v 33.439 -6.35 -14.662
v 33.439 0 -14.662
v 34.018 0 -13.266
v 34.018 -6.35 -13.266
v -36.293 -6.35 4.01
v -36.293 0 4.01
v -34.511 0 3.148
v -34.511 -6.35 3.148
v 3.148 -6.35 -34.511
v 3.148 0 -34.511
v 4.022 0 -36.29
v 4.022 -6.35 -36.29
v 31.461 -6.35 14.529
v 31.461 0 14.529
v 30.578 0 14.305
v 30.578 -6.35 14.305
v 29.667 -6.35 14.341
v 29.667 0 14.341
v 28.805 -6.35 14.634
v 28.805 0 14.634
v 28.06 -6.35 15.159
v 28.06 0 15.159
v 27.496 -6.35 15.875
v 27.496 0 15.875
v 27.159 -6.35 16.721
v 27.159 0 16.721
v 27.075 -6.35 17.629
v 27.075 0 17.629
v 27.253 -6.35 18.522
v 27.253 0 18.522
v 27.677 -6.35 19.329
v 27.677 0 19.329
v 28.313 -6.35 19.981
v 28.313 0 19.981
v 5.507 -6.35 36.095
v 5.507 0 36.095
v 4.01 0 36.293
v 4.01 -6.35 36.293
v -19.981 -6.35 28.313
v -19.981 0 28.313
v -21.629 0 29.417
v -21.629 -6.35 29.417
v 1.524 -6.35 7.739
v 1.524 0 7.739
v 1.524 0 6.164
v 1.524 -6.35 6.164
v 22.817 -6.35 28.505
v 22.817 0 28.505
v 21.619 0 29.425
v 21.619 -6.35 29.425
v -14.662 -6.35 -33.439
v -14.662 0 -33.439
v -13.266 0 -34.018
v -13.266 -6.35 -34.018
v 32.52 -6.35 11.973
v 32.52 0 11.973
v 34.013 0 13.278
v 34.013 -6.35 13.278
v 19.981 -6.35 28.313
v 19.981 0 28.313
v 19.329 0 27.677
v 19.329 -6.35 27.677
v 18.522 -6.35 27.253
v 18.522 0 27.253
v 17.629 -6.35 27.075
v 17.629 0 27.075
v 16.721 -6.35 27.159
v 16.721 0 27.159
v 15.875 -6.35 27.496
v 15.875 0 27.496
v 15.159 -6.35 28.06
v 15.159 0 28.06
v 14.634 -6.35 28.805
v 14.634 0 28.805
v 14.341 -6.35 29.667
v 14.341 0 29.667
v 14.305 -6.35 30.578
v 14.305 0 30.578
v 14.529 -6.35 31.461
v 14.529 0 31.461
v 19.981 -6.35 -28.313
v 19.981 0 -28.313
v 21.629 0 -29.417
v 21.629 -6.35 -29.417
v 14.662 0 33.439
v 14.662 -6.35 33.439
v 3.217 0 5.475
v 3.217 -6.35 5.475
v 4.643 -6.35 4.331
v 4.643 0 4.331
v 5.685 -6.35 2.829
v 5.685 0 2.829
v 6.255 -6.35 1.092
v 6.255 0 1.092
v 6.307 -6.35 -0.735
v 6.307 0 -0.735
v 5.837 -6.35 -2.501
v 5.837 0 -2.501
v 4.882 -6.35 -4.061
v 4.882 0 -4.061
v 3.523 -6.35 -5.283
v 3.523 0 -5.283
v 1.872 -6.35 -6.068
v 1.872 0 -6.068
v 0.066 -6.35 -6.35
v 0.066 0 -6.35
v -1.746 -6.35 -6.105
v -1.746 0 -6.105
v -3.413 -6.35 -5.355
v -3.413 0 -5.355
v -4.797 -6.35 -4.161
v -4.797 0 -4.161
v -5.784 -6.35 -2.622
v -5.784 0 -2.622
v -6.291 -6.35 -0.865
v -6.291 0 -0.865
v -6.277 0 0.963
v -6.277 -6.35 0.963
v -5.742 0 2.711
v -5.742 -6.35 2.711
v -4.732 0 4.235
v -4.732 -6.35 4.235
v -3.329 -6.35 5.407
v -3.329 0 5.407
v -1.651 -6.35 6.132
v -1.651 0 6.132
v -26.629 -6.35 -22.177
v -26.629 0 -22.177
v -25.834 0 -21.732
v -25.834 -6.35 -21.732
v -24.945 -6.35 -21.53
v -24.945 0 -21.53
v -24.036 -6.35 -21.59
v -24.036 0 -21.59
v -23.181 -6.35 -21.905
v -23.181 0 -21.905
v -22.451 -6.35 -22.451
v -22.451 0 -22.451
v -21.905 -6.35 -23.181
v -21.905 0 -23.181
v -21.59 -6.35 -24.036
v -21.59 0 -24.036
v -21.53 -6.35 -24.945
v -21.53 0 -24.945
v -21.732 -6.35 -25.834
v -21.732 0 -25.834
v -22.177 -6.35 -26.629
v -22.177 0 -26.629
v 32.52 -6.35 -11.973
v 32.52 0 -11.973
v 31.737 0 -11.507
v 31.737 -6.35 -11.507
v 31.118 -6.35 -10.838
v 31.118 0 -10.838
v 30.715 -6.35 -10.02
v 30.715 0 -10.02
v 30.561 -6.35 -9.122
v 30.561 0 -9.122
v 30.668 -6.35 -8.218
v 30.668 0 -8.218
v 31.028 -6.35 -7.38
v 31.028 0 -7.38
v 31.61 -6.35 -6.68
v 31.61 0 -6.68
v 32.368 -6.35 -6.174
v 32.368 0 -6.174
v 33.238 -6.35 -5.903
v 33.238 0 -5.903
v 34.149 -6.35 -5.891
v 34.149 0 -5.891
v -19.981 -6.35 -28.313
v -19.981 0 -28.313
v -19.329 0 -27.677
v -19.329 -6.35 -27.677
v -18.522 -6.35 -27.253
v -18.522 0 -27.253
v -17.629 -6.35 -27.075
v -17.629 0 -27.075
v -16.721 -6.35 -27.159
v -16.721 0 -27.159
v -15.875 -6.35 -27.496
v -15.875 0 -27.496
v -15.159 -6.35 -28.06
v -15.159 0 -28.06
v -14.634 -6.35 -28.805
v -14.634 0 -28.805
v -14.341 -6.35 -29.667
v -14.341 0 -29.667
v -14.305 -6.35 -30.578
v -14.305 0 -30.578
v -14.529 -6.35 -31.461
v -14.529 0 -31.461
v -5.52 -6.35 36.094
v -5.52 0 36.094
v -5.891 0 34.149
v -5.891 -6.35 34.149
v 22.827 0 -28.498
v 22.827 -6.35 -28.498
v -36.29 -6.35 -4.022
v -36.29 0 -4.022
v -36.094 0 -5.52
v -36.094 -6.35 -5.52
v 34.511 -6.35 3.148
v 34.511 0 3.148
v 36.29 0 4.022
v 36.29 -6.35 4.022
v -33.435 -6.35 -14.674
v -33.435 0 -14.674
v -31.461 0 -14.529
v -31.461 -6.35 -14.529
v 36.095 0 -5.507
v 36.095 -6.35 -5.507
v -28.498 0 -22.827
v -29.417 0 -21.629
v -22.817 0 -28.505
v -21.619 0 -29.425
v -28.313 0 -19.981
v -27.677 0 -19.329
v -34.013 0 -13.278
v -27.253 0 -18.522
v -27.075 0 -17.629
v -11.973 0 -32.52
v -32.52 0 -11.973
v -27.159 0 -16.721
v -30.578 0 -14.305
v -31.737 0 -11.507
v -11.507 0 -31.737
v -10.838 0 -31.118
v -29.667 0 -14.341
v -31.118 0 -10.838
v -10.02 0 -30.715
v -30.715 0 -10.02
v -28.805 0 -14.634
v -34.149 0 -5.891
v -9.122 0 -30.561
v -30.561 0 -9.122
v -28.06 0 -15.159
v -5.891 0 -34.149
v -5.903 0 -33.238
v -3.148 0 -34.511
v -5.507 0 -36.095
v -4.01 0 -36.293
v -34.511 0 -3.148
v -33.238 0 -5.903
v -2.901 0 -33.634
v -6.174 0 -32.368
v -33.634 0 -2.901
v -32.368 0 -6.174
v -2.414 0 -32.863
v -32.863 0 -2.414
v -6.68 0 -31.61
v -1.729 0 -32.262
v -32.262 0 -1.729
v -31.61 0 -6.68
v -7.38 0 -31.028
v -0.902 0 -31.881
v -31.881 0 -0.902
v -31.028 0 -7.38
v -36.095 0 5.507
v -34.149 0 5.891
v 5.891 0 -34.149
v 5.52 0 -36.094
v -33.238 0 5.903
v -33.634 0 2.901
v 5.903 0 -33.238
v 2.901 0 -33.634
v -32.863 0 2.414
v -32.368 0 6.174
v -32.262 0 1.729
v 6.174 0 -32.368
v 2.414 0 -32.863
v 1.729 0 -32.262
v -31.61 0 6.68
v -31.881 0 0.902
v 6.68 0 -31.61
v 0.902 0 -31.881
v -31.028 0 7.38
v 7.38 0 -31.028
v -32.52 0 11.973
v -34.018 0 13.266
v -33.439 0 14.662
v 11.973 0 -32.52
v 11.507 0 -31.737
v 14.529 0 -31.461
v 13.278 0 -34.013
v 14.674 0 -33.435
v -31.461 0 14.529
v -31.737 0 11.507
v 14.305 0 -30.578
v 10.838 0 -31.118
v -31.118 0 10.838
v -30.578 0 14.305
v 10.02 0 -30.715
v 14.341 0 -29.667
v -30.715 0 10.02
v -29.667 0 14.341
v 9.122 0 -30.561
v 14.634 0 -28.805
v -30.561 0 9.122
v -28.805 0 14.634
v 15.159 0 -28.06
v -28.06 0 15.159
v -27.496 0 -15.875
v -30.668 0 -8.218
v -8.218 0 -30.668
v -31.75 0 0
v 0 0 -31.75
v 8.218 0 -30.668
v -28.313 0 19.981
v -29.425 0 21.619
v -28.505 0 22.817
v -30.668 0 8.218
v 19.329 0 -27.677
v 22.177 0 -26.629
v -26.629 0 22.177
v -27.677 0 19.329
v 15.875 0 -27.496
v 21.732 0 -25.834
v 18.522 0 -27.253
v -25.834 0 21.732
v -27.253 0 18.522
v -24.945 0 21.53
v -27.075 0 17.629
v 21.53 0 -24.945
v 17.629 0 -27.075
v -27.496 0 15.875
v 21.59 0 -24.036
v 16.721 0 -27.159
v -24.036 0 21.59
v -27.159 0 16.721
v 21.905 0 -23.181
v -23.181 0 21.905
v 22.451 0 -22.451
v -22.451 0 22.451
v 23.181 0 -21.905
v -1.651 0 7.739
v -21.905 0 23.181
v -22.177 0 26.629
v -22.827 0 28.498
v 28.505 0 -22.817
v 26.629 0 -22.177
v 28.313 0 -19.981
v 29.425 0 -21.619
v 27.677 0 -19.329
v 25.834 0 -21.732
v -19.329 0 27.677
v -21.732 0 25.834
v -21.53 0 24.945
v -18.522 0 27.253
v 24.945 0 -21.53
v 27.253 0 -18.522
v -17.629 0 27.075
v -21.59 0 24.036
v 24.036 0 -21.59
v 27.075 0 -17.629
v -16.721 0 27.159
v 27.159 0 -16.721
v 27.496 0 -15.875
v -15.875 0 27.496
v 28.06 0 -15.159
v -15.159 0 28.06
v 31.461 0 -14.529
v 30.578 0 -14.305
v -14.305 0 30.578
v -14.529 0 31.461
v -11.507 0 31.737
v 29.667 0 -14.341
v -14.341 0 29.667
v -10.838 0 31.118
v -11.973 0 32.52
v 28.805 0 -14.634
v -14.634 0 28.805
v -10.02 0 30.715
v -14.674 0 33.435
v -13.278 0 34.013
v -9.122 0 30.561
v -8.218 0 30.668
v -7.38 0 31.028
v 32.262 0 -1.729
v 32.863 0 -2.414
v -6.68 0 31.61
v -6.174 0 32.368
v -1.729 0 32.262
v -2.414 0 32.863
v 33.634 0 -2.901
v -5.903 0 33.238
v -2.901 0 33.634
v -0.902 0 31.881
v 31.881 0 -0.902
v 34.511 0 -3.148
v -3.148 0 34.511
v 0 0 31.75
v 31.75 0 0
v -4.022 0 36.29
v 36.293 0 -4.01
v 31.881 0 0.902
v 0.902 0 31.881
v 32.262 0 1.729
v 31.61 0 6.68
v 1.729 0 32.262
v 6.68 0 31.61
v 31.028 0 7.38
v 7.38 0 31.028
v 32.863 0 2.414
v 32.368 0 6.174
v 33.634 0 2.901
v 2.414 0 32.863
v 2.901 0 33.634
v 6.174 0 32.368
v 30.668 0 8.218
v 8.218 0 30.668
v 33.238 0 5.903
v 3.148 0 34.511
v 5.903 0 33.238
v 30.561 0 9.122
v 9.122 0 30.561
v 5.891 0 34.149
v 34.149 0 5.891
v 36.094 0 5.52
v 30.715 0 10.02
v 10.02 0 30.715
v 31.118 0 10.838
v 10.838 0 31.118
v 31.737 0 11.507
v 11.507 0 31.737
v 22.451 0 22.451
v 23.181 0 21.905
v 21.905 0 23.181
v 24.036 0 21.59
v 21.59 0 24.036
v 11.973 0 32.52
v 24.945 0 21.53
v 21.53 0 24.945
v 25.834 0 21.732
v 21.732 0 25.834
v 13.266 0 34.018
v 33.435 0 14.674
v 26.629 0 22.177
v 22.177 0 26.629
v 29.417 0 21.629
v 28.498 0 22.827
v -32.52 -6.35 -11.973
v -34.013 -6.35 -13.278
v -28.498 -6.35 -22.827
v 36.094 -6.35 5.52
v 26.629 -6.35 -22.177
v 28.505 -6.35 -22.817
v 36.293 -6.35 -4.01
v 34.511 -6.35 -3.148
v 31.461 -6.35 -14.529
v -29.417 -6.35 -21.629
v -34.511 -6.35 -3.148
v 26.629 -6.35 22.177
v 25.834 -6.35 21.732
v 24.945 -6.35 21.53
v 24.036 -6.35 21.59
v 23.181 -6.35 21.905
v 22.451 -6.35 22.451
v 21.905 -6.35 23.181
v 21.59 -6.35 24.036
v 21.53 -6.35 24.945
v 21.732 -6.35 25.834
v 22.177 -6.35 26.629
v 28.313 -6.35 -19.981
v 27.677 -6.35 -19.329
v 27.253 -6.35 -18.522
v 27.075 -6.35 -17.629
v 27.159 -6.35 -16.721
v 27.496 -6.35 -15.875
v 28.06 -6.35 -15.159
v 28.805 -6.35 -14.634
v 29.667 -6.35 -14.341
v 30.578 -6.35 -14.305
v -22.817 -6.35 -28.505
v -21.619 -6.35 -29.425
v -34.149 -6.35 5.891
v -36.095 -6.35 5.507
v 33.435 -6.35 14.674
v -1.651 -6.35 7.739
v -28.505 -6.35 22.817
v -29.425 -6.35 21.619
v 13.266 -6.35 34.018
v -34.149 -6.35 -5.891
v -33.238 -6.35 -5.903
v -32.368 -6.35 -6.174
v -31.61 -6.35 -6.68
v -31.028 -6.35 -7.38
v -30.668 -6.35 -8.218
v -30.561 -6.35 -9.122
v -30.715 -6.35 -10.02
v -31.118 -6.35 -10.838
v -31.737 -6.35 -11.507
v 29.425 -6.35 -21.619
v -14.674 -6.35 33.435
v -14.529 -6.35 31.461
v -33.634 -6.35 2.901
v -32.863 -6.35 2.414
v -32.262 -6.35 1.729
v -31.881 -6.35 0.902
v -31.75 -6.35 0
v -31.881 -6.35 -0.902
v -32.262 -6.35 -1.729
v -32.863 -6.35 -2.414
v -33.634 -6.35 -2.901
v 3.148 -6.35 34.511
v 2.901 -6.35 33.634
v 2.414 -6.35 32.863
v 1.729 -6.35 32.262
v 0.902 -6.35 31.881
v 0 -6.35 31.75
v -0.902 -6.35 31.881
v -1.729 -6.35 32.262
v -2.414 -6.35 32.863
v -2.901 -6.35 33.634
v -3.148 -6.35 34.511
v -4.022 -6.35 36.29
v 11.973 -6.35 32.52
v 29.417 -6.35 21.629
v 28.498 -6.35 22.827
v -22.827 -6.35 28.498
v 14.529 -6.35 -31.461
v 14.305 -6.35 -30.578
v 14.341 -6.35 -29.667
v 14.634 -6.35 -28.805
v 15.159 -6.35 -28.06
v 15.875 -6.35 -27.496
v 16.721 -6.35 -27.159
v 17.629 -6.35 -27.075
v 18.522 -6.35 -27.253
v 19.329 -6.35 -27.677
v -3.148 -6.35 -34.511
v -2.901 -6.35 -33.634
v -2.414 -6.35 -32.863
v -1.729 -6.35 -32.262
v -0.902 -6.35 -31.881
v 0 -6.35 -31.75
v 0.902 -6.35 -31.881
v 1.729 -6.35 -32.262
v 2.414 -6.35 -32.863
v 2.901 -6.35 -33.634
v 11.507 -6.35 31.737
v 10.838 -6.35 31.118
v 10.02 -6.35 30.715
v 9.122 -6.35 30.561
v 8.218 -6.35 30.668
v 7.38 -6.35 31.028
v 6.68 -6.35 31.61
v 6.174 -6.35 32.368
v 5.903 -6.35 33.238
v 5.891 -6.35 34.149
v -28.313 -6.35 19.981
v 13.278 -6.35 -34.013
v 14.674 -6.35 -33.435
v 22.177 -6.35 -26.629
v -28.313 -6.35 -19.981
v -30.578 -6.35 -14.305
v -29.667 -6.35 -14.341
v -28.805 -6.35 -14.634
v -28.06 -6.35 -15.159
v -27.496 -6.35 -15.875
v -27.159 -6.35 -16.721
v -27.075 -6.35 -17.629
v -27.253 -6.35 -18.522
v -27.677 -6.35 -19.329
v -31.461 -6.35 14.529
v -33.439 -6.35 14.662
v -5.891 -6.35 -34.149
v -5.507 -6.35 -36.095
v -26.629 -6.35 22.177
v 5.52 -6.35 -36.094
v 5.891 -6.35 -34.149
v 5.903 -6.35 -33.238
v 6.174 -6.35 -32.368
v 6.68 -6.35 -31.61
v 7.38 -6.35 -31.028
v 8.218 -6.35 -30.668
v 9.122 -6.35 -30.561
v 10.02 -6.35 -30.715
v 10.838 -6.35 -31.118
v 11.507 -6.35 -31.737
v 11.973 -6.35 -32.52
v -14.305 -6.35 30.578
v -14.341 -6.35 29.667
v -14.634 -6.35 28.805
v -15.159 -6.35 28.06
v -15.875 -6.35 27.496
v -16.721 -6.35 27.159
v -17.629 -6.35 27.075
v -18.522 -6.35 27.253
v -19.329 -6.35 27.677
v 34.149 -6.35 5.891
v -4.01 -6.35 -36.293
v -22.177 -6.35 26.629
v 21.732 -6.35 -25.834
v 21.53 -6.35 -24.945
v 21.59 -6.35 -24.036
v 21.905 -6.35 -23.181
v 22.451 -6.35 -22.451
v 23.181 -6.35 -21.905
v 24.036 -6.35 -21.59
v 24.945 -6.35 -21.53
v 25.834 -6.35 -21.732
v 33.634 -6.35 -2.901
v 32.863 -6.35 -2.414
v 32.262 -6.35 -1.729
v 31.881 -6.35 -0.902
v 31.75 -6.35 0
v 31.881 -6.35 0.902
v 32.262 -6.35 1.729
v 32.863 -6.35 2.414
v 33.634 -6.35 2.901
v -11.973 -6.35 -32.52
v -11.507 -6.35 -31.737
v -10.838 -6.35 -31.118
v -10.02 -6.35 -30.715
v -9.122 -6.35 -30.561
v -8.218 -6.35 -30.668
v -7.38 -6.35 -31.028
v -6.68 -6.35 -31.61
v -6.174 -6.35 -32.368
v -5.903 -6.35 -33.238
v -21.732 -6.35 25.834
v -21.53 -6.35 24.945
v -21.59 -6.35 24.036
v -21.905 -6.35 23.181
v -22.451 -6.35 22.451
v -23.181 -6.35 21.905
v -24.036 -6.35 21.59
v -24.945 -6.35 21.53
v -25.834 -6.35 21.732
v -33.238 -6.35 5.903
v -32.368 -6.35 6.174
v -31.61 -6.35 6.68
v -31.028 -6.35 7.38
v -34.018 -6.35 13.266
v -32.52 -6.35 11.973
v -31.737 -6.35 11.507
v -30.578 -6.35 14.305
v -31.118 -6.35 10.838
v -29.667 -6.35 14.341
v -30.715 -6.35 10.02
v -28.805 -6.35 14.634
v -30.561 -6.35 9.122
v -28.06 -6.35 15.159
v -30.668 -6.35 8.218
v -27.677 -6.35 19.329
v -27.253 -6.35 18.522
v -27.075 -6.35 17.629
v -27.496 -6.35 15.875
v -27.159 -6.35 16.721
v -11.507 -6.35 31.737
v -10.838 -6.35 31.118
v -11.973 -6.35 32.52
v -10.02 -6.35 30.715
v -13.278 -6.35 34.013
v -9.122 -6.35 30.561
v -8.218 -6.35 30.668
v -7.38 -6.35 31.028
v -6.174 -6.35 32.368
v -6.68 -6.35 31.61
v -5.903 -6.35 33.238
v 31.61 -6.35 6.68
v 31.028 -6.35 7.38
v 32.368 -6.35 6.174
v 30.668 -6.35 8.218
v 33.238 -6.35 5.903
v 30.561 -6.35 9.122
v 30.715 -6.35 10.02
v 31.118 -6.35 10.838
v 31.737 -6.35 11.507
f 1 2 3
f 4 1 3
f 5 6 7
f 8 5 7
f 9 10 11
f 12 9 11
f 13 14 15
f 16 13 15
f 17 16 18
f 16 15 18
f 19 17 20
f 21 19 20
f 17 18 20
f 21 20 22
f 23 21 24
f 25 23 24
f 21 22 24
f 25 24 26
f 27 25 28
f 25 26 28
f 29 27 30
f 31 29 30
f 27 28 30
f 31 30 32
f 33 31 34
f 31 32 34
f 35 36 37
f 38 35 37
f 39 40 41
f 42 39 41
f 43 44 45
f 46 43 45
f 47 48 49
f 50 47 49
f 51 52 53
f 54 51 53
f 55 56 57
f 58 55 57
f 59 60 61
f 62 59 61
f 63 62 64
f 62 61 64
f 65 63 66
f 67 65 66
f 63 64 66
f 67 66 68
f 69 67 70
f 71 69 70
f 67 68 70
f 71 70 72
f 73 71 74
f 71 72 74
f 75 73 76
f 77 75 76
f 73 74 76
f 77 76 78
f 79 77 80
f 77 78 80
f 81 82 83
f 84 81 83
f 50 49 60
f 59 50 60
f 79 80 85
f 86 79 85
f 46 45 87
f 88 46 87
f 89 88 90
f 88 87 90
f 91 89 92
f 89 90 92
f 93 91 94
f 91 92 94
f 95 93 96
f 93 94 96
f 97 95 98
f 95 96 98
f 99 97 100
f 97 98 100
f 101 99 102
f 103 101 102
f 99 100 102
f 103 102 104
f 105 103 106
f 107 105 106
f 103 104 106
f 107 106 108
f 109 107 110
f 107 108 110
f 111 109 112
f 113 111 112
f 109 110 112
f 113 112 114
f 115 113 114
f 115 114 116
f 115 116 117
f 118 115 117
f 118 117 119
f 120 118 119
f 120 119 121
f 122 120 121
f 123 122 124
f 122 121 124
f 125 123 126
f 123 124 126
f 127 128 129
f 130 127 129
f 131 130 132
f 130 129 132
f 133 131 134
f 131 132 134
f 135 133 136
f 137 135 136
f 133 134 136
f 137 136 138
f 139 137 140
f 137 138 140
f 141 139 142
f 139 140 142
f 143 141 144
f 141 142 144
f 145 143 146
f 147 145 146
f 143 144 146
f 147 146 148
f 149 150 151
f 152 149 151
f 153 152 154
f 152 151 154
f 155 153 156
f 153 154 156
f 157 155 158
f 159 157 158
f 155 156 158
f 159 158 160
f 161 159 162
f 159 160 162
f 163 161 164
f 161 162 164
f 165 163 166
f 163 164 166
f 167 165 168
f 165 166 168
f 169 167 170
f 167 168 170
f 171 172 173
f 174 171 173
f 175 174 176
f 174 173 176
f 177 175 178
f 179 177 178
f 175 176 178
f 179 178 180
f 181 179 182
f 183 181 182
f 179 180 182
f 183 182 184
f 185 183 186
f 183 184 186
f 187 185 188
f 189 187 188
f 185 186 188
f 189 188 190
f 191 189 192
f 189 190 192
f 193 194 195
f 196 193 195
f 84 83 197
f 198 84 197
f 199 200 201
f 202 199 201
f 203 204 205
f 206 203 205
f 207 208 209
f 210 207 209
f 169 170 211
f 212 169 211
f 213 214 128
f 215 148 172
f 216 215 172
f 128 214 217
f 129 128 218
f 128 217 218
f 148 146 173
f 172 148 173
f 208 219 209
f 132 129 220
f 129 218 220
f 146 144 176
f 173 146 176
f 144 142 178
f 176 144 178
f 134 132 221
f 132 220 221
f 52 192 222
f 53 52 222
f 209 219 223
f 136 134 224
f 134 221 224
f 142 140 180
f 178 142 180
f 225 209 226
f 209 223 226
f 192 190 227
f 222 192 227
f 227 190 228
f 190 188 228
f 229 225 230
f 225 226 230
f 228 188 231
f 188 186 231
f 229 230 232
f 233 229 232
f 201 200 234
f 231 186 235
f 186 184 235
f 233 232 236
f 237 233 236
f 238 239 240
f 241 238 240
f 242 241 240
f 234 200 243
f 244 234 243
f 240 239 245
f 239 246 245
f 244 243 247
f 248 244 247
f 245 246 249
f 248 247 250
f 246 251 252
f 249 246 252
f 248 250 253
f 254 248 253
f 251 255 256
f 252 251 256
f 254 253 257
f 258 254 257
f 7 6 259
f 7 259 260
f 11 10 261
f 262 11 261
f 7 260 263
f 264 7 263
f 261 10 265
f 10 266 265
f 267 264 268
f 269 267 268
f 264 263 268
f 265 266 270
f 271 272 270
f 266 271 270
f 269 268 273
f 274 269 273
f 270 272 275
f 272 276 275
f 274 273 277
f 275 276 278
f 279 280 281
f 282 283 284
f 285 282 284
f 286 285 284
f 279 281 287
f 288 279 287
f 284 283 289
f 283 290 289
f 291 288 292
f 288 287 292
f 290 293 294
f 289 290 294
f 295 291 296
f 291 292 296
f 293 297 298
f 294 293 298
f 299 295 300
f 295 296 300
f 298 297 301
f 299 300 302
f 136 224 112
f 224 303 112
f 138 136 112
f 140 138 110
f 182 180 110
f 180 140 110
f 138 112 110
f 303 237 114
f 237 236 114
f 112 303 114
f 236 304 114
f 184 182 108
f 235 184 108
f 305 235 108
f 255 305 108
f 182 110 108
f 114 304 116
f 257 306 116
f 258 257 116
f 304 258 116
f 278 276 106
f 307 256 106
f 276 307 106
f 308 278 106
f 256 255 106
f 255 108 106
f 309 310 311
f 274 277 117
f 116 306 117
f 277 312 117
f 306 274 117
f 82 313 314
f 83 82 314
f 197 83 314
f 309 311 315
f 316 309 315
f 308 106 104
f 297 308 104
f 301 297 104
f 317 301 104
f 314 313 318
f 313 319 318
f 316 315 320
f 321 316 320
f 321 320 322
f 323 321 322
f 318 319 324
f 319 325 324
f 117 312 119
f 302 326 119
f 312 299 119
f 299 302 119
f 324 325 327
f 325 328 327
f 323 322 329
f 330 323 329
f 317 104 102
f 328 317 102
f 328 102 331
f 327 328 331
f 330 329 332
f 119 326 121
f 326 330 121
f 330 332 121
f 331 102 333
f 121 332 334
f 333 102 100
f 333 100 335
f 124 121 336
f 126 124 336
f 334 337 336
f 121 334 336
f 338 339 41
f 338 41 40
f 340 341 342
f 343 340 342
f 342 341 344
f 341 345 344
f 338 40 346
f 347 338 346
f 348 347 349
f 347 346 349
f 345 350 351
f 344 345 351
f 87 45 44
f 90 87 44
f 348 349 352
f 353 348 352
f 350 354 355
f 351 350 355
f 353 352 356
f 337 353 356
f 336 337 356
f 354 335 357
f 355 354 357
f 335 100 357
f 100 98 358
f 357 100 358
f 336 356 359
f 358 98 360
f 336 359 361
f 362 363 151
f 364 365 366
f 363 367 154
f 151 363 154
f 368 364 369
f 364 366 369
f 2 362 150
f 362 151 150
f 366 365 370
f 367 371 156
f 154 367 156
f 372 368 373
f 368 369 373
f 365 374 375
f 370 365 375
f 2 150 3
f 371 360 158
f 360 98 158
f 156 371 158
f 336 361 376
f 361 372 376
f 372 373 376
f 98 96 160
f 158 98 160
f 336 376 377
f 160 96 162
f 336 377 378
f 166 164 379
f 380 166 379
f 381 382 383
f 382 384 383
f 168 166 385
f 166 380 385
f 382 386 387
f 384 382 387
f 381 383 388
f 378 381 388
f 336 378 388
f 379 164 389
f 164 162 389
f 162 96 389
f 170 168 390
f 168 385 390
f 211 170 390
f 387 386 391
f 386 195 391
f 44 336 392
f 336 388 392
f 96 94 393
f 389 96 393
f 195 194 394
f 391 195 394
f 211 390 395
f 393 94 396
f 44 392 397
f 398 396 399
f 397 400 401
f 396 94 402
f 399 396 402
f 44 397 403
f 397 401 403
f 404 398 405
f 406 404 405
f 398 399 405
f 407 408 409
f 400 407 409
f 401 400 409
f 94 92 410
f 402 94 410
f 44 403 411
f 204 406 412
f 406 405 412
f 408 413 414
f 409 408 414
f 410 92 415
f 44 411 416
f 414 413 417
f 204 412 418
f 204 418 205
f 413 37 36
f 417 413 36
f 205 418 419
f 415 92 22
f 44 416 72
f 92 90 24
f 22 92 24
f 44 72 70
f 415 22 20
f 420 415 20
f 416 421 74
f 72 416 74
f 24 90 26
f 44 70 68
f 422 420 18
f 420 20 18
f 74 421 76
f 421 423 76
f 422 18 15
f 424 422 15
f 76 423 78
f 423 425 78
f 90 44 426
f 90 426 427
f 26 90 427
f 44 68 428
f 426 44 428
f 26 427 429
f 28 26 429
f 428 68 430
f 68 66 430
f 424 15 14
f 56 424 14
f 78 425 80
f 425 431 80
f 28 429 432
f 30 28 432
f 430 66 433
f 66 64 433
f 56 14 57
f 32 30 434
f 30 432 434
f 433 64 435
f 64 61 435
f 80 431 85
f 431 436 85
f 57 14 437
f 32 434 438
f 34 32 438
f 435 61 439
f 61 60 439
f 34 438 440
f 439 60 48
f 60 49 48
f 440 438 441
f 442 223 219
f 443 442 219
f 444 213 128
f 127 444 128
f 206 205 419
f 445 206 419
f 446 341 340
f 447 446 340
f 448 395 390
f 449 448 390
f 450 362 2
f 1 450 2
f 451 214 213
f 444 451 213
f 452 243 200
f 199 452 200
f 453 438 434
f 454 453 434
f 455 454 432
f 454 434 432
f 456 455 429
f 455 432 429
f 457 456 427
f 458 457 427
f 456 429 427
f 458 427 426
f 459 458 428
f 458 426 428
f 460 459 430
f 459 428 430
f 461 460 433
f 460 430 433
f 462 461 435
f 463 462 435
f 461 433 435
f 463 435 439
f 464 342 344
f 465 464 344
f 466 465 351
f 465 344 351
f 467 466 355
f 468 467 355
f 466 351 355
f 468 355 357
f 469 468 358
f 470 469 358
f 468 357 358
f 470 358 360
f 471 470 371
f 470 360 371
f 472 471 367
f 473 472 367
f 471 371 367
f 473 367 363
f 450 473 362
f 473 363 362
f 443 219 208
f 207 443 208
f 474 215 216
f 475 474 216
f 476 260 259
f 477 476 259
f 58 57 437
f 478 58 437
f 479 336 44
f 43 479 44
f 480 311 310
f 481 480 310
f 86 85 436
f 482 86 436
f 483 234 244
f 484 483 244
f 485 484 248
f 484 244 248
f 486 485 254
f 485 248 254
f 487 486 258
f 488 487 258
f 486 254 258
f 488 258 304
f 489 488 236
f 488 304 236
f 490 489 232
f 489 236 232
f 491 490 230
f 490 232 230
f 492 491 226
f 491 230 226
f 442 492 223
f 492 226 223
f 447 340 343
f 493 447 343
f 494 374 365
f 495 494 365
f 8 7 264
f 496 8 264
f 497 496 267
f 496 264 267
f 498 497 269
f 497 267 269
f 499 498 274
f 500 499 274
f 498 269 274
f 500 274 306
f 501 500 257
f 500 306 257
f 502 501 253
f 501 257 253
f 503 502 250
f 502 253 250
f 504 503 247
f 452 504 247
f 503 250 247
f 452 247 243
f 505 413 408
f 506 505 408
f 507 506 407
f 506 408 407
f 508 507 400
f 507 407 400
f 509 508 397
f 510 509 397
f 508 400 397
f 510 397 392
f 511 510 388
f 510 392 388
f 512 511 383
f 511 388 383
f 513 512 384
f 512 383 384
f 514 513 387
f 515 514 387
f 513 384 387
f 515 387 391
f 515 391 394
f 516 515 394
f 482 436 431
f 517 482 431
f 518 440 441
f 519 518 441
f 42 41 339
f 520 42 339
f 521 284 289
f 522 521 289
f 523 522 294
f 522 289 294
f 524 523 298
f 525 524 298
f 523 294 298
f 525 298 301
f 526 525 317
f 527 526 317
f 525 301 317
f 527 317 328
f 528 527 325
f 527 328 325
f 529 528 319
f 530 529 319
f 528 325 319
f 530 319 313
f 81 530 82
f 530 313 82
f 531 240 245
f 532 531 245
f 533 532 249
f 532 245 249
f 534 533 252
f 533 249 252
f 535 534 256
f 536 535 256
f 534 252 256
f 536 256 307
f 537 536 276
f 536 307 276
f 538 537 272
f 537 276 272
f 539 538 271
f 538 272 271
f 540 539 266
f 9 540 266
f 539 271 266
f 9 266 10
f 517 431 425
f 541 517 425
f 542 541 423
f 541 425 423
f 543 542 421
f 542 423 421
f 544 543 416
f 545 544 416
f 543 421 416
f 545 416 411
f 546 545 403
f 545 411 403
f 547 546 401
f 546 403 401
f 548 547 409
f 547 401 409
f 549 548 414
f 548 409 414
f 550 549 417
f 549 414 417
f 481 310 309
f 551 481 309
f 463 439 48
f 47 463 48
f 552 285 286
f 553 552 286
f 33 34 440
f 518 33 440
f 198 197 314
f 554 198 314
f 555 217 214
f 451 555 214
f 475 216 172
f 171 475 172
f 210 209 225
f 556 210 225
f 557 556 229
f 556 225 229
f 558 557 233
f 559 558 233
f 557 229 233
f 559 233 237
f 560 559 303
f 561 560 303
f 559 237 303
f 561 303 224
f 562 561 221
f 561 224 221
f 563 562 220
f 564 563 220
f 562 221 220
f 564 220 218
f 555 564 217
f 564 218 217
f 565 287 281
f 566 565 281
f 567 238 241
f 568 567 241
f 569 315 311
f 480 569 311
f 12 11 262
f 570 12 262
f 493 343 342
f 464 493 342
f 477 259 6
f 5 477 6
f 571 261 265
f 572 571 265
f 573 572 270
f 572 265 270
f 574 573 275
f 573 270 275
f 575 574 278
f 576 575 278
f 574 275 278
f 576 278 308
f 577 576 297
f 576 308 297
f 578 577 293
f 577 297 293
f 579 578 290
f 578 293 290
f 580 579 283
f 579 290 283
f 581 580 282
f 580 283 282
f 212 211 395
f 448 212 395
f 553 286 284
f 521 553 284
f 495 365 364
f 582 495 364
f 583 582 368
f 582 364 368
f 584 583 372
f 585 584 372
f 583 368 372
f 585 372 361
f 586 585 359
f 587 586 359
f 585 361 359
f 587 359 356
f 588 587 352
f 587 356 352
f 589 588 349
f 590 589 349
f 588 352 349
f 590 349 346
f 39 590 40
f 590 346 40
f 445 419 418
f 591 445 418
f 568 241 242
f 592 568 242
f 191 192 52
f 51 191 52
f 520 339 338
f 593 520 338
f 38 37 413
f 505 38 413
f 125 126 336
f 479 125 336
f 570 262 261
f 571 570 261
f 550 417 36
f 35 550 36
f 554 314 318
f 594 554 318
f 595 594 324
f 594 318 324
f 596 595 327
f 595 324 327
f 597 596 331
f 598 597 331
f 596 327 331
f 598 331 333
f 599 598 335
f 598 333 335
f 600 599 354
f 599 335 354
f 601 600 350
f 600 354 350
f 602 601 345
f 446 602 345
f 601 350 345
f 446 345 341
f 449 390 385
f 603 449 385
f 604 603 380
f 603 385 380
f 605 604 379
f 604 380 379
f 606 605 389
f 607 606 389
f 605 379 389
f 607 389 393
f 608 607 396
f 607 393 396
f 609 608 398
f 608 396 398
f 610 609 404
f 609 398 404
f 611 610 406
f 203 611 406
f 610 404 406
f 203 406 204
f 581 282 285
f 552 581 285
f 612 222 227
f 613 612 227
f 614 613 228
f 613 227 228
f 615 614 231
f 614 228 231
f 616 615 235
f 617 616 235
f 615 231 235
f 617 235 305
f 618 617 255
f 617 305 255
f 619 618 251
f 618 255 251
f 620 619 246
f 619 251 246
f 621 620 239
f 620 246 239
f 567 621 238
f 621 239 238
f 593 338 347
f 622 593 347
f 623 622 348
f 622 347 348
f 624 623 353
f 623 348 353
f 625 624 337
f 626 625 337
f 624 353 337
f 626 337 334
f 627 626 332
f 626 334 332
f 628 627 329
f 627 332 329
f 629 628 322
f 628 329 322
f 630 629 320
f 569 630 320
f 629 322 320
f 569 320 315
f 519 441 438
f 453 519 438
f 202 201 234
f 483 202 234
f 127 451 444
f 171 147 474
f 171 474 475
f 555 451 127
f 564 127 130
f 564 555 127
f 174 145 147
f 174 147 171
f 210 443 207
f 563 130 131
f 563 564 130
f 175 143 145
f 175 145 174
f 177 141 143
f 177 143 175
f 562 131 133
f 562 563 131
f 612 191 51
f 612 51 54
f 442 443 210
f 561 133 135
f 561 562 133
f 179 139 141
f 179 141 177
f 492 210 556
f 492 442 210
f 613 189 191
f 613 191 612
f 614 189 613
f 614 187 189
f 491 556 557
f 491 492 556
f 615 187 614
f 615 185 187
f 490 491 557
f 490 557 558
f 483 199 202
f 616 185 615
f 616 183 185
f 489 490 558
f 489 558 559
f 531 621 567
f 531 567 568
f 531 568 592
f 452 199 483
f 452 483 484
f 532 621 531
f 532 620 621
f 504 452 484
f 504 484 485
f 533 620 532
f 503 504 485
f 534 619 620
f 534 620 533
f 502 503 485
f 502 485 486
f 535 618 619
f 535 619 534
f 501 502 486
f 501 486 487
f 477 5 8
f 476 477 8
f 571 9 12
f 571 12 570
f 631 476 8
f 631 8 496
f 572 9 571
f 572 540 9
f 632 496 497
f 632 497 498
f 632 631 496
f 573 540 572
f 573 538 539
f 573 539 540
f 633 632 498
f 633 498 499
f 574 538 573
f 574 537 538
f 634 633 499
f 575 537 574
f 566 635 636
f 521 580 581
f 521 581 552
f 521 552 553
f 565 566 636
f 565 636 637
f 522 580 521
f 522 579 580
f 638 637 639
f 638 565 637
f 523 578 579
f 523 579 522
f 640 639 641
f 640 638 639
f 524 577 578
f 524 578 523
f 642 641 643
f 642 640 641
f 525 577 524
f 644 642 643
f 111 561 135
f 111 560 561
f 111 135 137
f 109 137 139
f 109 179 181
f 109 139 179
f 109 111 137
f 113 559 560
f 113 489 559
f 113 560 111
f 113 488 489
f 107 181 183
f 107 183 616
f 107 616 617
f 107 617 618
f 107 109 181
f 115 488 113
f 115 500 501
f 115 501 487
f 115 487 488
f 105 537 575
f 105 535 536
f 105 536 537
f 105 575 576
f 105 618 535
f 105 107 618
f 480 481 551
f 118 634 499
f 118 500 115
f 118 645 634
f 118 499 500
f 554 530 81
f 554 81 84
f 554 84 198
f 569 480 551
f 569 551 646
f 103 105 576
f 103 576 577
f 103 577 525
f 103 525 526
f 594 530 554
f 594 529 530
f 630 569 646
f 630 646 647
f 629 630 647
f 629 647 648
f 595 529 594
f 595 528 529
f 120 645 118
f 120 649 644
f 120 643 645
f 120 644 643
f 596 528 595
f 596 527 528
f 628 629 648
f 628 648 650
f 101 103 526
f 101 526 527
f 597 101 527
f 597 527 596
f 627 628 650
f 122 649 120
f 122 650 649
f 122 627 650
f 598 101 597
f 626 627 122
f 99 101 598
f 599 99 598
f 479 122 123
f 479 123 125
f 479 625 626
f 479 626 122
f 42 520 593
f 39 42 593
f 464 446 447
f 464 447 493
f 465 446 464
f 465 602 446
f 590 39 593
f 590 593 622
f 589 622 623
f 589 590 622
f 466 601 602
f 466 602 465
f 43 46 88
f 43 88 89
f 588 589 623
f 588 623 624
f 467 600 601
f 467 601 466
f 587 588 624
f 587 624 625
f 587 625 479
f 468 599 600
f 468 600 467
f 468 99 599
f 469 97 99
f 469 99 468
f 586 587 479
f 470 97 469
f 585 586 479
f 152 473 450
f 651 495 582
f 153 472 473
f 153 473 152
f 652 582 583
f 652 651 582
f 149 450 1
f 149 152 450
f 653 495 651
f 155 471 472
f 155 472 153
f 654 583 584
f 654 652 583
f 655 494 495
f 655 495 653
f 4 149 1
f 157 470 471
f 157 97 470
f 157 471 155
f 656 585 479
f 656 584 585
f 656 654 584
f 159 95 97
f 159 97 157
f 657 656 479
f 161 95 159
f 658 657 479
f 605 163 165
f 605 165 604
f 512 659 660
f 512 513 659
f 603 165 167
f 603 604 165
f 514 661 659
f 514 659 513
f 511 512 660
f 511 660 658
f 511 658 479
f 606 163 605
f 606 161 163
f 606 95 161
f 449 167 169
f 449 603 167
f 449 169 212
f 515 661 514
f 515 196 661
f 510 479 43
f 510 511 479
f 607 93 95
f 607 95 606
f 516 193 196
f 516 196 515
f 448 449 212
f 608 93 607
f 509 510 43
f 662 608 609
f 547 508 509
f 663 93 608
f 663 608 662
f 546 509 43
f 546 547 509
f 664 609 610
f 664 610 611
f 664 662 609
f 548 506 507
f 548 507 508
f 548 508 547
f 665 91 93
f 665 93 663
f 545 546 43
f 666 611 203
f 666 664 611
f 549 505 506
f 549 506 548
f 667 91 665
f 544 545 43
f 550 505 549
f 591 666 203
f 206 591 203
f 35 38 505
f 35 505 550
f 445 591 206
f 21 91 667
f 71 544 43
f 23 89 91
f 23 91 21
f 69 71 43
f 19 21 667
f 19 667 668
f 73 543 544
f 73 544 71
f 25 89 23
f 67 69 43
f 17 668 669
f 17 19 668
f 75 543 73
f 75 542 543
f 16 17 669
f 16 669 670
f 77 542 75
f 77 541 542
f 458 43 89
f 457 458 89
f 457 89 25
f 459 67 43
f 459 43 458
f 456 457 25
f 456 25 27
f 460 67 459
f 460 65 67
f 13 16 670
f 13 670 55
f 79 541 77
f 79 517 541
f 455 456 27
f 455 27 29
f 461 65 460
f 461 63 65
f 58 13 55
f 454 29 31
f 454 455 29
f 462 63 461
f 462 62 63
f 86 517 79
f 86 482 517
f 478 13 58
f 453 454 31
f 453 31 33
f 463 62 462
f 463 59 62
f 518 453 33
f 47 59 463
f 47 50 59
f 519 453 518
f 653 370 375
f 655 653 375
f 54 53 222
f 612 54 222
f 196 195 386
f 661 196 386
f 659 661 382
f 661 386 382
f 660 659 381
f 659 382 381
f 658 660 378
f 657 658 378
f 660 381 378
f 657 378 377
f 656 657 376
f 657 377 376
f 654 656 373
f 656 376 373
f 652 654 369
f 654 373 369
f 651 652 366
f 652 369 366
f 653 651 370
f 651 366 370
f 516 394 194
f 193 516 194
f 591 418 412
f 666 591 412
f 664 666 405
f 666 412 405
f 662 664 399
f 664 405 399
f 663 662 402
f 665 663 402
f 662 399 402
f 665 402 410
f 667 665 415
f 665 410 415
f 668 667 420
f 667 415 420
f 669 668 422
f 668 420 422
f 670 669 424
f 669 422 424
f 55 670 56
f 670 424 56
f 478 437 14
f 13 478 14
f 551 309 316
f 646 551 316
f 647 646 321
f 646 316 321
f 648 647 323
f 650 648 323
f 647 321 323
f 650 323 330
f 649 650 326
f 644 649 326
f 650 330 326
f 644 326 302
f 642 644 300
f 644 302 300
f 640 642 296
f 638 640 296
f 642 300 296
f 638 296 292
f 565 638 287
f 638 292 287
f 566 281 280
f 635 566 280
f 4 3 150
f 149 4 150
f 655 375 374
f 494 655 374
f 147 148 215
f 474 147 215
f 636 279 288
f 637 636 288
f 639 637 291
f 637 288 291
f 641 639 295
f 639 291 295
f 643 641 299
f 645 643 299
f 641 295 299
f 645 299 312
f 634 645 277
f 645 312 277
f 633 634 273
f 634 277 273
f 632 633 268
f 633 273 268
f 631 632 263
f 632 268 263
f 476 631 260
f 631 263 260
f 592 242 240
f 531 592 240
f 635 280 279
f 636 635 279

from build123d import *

# Parameters (mm, degrees)
F1_DEPTH = 6.35


with BuildPart() as f1:
    # F0 (on Front) → F1 (new body)
    with BuildSketch(Plane.XZ):
        with BuildLine():
            ThreePointArc((3.147837, 34.510579), (0, 31.75), (-3.147837, 34.510579))
            Line((-3.147837, 34.510579), (-4.022344, 36.290266))
            Line((-4.022344, 36.290266), (-5.520025, 36.093734))
            Line((-5.520025, 36.093734), (-5.891418, 34.14938))
            ThreePointArc((-5.891418, 34.14938), (-8.217505, 30.668145), (-11.972573, 32.51994))
            Line((-11.972573, 32.51994), (-13.277898, 34.012646))
            Line((-13.277898, 34.012646), (-14.673681, 33.435182))
            Line((-14.673681, 33.435182), (-14.529182, 31.460957))
            ThreePointArc((-14.529182, 31.460957), (-15.875, 27.496307), (-19.981397, 28.31312))
            Line((-19.981397, 28.31312), (-21.628585, 29.41712))
            Line((-21.628585, 29.41712), (-22.827349, 28.498078))
            Line((-22.827349, 28.498078), (-22.176807, 26.628522))
            ThreePointArc((-22.176807, 26.628522), (-22.45064, 22.45064), (-26.628522, 22.176807))
            Line((-26.628522, 22.176807), (-28.50532, 22.816867))
            Line((-28.50532, 22.816867), (-29.425371, 21.618877))
            Line((-29.425371, 21.618877), (-28.31312, 19.981397))
            ThreePointArc((-28.31312, 19.981397), (-27.496307, 15.875), (-31.460957, 14.529182))
            Line((-31.460957, 14.529182), (-33.439464, 14.661681))
            Line((-33.439464, 14.661681), (-34.018103, 13.266385))
            Line((-34.018103, 13.266385), (-32.51994, 11.972573))
            ThreePointArc((-32.51994, 11.972573), (-30.668145, 8.217505), (-34.14938, 5.891418))
            Line((-34.14938, 5.891418), (-36.094764, 5.507326))
            Line((-36.094764, 5.507326), (-36.292557, 4.009811))
            Line((-36.292557, 4.009811), (-34.510579, 3.147837))
            ThreePointArc((-34.510579, 3.147837), (-31.75, 0), (-34.510579, -3.147837))
            Line((-34.510579, -3.147837), (-36.290266, -4.022344))
            Line((-36.290266, -4.022344), (-36.093734, -5.520025))
            Line((-36.093734, -5.520025), (-34.14938, -5.891418))
            ThreePointArc((-34.14938, -5.891418), (-30.668145, -8.217505), (-32.51994, -11.972573))
            Line((-32.51994, -11.972573), (-34.012646, -13.277898))
            Line((-34.012646, -13.277898), (-33.435182, -14.673681))
            Line((-33.435182, -14.673681), (-31.460957, -14.529182))
            ThreePointArc((-31.460957, -14.529182), (-27.496307, -15.875), (-28.31312, -19.981397))
            Line((-28.31312, -19.981397), (-29.41712, -21.628585))
            Line((-29.41712, -21.628585), (-28.498078, -22.827349))
            Line((-28.498078, -22.827349), (-26.628522, -22.176807))
            ThreePointArc((-26.628522, -22.176807), (-22.45064, -22.45064), (-22.176807, -26.628522))
            Line((-22.176807, -26.628522), (-22.816867, -28.50532))
            Line((-22.816867, -28.50532), (-21.618877, -29.425371))
            Line((-21.618877, -29.425371), (-19.981397, -28.31312))
            ThreePointArc((-19.981397, -28.31312), (-15.875, -27.496307), (-14.529182, -31.460957))
            Line((-14.529182, -31.460957), (-14.661681, -33.439464))
            Line((-14.661681, -33.439464), (-13.266385, -34.018103))
            Line((-13.266385, -34.018103), (-11.972573, -32.51994))
            ThreePointArc((-11.972573, -32.51994), (-8.217505, -30.668145), (-5.891418, -34.14938))
            Line((-5.891418, -34.14938), (-5.507326, -36.094764))
            Line((-5.507326, -36.094764), (-4.009811, -36.292557))
            Line((-4.009811, -36.292557), (-3.147837, -34.510579))
            ThreePointArc((-3.147837, -34.510579), (0, -31.75), (3.147837, -34.510579))
            Line((3.147837, -34.510579), (4.022344, -36.290266))
            Line((4.022344, -36.290266), (5.520025, -36.093734))
            Line((5.520025, -36.093734), (5.891418, -34.14938))
            ThreePointArc((5.891418, -34.14938), (8.217505, -30.668145), (11.972573, -32.51994))
            Line((11.972573, -32.51994), (13.277898, -34.012646))
            Line((13.277898, -34.012646), (14.673681, -33.435182))
            Line((14.673681, -33.435182), (14.529182, -31.460957))
            ThreePointArc((14.529182, -31.460957), (15.875, -27.496307), (19.981397, -28.31312))
            Line((19.981397, -28.31312), (21.628585, -29.41712))
            Line((21.628585, -29.41712), (22.827349, -28.498078))
            Line((22.827349, -28.498078), (22.176807, -26.628522))
            ThreePointArc((22.176807, -26.628522), (22.45064, -22.45064), (26.628522, -22.176807))
            Line((26.628522, -22.176807), (28.50532, -22.816867))
            Line((28.50532, -22.816867), (29.425371, -21.618877))
            Line((29.425371, -21.618877), (28.31312, -19.981397))
            ThreePointArc((28.31312, -19.981397), (27.496307, -15.875), (31.460957, -14.529182))
            Line((31.460957, -14.529182), (33.439464, -14.661681))
            Line((33.439464, -14.661681), (34.018103, -13.266385))
            Line((34.018103, -13.266385), (32.51994, -11.972573))
            ThreePointArc((32.51994, -11.972573), (30.668145, -8.217505), (34.14938, -5.891418))
            Line((34.14938, -5.891418), (36.094764, -5.507326))
            Line((36.094764, -5.507326), (36.292557, -4.009811))
            Line((36.292557, -4.009811), (34.510579, -3.147837))
            ThreePointArc((34.510579, -3.147837), (31.75, 0), (34.510579, 3.147837))
            Line((34.510579, 3.147837), (36.290266, 4.022344))
            Line((36.290266, 4.022344), (36.093734, 5.520025))
            Line((36.093734, 5.520025), (34.14938, 5.891418))
            ThreePointArc((34.14938, 5.891418), (30.668145, 8.217505), (32.51994, 11.972573))
            Line((32.51994, 11.972573), (34.012646, 13.277898))
            Line((34.012646, 13.277898), (33.435182, 14.673681))
            Line((33.435182, 14.673681), (31.460957, 14.529182))
            ThreePointArc((31.460957, 14.529182), (27.496307, 15.875), (28.31312, 19.981397))
            Line((28.31312, 19.981397), (29.41712, 21.628585))
            Line((29.41712, 21.628585), (28.498078, 22.827349))
            Line((28.498078, 22.827349), (26.628522, 22.176807))
            ThreePointArc((26.628522, 22.176807), (22.45064, 22.45064), (22.176807, 26.628522))
            Line((22.176807, 26.628522), (22.816867, 28.50532))
            Line((22.816867, 28.50532), (21.618877, 29.425371))
            Line((21.618877, 29.425371), (19.981397, 28.31312))
            ThreePointArc((19.981397, 28.31312), (15.875, 27.496307), (14.529182, 31.460957))
            Line((14.529182, 31.460957), (14.661681, 33.439464))
            Line((14.661681, 33.439464), (13.266385, 34.018103))
            Line((13.266385, 34.018103), (11.972573, 32.51994))
            ThreePointArc((11.972573, 32.51994), (8.217505, 30.668145), (5.891418, 34.14938))
            Line((5.891418, 34.14938), (5.507326, 36.094764))
            Line((5.507326, 36.094764), (4.009811, 36.292557))
            Line((4.009811, 36.292557), (3.147837, 34.510579))
        make_face()
        with BuildLine():
            ThreePointArc((1.524, 6.164408), (0.065583, -6.349661), (-1.651, 6.131615))
            Line((-1.651, 6.131615), (-1.651, 7.739208))
            Line((-1.651, 7.739208), (1.524, 7.739208))
            Line((1.524, 7.739208), (1.524, 6.164408))
        make_face(mode=Mode.SUBTRACT)
    extrude(amount=F1_DEPTH)


solid = f1.part
